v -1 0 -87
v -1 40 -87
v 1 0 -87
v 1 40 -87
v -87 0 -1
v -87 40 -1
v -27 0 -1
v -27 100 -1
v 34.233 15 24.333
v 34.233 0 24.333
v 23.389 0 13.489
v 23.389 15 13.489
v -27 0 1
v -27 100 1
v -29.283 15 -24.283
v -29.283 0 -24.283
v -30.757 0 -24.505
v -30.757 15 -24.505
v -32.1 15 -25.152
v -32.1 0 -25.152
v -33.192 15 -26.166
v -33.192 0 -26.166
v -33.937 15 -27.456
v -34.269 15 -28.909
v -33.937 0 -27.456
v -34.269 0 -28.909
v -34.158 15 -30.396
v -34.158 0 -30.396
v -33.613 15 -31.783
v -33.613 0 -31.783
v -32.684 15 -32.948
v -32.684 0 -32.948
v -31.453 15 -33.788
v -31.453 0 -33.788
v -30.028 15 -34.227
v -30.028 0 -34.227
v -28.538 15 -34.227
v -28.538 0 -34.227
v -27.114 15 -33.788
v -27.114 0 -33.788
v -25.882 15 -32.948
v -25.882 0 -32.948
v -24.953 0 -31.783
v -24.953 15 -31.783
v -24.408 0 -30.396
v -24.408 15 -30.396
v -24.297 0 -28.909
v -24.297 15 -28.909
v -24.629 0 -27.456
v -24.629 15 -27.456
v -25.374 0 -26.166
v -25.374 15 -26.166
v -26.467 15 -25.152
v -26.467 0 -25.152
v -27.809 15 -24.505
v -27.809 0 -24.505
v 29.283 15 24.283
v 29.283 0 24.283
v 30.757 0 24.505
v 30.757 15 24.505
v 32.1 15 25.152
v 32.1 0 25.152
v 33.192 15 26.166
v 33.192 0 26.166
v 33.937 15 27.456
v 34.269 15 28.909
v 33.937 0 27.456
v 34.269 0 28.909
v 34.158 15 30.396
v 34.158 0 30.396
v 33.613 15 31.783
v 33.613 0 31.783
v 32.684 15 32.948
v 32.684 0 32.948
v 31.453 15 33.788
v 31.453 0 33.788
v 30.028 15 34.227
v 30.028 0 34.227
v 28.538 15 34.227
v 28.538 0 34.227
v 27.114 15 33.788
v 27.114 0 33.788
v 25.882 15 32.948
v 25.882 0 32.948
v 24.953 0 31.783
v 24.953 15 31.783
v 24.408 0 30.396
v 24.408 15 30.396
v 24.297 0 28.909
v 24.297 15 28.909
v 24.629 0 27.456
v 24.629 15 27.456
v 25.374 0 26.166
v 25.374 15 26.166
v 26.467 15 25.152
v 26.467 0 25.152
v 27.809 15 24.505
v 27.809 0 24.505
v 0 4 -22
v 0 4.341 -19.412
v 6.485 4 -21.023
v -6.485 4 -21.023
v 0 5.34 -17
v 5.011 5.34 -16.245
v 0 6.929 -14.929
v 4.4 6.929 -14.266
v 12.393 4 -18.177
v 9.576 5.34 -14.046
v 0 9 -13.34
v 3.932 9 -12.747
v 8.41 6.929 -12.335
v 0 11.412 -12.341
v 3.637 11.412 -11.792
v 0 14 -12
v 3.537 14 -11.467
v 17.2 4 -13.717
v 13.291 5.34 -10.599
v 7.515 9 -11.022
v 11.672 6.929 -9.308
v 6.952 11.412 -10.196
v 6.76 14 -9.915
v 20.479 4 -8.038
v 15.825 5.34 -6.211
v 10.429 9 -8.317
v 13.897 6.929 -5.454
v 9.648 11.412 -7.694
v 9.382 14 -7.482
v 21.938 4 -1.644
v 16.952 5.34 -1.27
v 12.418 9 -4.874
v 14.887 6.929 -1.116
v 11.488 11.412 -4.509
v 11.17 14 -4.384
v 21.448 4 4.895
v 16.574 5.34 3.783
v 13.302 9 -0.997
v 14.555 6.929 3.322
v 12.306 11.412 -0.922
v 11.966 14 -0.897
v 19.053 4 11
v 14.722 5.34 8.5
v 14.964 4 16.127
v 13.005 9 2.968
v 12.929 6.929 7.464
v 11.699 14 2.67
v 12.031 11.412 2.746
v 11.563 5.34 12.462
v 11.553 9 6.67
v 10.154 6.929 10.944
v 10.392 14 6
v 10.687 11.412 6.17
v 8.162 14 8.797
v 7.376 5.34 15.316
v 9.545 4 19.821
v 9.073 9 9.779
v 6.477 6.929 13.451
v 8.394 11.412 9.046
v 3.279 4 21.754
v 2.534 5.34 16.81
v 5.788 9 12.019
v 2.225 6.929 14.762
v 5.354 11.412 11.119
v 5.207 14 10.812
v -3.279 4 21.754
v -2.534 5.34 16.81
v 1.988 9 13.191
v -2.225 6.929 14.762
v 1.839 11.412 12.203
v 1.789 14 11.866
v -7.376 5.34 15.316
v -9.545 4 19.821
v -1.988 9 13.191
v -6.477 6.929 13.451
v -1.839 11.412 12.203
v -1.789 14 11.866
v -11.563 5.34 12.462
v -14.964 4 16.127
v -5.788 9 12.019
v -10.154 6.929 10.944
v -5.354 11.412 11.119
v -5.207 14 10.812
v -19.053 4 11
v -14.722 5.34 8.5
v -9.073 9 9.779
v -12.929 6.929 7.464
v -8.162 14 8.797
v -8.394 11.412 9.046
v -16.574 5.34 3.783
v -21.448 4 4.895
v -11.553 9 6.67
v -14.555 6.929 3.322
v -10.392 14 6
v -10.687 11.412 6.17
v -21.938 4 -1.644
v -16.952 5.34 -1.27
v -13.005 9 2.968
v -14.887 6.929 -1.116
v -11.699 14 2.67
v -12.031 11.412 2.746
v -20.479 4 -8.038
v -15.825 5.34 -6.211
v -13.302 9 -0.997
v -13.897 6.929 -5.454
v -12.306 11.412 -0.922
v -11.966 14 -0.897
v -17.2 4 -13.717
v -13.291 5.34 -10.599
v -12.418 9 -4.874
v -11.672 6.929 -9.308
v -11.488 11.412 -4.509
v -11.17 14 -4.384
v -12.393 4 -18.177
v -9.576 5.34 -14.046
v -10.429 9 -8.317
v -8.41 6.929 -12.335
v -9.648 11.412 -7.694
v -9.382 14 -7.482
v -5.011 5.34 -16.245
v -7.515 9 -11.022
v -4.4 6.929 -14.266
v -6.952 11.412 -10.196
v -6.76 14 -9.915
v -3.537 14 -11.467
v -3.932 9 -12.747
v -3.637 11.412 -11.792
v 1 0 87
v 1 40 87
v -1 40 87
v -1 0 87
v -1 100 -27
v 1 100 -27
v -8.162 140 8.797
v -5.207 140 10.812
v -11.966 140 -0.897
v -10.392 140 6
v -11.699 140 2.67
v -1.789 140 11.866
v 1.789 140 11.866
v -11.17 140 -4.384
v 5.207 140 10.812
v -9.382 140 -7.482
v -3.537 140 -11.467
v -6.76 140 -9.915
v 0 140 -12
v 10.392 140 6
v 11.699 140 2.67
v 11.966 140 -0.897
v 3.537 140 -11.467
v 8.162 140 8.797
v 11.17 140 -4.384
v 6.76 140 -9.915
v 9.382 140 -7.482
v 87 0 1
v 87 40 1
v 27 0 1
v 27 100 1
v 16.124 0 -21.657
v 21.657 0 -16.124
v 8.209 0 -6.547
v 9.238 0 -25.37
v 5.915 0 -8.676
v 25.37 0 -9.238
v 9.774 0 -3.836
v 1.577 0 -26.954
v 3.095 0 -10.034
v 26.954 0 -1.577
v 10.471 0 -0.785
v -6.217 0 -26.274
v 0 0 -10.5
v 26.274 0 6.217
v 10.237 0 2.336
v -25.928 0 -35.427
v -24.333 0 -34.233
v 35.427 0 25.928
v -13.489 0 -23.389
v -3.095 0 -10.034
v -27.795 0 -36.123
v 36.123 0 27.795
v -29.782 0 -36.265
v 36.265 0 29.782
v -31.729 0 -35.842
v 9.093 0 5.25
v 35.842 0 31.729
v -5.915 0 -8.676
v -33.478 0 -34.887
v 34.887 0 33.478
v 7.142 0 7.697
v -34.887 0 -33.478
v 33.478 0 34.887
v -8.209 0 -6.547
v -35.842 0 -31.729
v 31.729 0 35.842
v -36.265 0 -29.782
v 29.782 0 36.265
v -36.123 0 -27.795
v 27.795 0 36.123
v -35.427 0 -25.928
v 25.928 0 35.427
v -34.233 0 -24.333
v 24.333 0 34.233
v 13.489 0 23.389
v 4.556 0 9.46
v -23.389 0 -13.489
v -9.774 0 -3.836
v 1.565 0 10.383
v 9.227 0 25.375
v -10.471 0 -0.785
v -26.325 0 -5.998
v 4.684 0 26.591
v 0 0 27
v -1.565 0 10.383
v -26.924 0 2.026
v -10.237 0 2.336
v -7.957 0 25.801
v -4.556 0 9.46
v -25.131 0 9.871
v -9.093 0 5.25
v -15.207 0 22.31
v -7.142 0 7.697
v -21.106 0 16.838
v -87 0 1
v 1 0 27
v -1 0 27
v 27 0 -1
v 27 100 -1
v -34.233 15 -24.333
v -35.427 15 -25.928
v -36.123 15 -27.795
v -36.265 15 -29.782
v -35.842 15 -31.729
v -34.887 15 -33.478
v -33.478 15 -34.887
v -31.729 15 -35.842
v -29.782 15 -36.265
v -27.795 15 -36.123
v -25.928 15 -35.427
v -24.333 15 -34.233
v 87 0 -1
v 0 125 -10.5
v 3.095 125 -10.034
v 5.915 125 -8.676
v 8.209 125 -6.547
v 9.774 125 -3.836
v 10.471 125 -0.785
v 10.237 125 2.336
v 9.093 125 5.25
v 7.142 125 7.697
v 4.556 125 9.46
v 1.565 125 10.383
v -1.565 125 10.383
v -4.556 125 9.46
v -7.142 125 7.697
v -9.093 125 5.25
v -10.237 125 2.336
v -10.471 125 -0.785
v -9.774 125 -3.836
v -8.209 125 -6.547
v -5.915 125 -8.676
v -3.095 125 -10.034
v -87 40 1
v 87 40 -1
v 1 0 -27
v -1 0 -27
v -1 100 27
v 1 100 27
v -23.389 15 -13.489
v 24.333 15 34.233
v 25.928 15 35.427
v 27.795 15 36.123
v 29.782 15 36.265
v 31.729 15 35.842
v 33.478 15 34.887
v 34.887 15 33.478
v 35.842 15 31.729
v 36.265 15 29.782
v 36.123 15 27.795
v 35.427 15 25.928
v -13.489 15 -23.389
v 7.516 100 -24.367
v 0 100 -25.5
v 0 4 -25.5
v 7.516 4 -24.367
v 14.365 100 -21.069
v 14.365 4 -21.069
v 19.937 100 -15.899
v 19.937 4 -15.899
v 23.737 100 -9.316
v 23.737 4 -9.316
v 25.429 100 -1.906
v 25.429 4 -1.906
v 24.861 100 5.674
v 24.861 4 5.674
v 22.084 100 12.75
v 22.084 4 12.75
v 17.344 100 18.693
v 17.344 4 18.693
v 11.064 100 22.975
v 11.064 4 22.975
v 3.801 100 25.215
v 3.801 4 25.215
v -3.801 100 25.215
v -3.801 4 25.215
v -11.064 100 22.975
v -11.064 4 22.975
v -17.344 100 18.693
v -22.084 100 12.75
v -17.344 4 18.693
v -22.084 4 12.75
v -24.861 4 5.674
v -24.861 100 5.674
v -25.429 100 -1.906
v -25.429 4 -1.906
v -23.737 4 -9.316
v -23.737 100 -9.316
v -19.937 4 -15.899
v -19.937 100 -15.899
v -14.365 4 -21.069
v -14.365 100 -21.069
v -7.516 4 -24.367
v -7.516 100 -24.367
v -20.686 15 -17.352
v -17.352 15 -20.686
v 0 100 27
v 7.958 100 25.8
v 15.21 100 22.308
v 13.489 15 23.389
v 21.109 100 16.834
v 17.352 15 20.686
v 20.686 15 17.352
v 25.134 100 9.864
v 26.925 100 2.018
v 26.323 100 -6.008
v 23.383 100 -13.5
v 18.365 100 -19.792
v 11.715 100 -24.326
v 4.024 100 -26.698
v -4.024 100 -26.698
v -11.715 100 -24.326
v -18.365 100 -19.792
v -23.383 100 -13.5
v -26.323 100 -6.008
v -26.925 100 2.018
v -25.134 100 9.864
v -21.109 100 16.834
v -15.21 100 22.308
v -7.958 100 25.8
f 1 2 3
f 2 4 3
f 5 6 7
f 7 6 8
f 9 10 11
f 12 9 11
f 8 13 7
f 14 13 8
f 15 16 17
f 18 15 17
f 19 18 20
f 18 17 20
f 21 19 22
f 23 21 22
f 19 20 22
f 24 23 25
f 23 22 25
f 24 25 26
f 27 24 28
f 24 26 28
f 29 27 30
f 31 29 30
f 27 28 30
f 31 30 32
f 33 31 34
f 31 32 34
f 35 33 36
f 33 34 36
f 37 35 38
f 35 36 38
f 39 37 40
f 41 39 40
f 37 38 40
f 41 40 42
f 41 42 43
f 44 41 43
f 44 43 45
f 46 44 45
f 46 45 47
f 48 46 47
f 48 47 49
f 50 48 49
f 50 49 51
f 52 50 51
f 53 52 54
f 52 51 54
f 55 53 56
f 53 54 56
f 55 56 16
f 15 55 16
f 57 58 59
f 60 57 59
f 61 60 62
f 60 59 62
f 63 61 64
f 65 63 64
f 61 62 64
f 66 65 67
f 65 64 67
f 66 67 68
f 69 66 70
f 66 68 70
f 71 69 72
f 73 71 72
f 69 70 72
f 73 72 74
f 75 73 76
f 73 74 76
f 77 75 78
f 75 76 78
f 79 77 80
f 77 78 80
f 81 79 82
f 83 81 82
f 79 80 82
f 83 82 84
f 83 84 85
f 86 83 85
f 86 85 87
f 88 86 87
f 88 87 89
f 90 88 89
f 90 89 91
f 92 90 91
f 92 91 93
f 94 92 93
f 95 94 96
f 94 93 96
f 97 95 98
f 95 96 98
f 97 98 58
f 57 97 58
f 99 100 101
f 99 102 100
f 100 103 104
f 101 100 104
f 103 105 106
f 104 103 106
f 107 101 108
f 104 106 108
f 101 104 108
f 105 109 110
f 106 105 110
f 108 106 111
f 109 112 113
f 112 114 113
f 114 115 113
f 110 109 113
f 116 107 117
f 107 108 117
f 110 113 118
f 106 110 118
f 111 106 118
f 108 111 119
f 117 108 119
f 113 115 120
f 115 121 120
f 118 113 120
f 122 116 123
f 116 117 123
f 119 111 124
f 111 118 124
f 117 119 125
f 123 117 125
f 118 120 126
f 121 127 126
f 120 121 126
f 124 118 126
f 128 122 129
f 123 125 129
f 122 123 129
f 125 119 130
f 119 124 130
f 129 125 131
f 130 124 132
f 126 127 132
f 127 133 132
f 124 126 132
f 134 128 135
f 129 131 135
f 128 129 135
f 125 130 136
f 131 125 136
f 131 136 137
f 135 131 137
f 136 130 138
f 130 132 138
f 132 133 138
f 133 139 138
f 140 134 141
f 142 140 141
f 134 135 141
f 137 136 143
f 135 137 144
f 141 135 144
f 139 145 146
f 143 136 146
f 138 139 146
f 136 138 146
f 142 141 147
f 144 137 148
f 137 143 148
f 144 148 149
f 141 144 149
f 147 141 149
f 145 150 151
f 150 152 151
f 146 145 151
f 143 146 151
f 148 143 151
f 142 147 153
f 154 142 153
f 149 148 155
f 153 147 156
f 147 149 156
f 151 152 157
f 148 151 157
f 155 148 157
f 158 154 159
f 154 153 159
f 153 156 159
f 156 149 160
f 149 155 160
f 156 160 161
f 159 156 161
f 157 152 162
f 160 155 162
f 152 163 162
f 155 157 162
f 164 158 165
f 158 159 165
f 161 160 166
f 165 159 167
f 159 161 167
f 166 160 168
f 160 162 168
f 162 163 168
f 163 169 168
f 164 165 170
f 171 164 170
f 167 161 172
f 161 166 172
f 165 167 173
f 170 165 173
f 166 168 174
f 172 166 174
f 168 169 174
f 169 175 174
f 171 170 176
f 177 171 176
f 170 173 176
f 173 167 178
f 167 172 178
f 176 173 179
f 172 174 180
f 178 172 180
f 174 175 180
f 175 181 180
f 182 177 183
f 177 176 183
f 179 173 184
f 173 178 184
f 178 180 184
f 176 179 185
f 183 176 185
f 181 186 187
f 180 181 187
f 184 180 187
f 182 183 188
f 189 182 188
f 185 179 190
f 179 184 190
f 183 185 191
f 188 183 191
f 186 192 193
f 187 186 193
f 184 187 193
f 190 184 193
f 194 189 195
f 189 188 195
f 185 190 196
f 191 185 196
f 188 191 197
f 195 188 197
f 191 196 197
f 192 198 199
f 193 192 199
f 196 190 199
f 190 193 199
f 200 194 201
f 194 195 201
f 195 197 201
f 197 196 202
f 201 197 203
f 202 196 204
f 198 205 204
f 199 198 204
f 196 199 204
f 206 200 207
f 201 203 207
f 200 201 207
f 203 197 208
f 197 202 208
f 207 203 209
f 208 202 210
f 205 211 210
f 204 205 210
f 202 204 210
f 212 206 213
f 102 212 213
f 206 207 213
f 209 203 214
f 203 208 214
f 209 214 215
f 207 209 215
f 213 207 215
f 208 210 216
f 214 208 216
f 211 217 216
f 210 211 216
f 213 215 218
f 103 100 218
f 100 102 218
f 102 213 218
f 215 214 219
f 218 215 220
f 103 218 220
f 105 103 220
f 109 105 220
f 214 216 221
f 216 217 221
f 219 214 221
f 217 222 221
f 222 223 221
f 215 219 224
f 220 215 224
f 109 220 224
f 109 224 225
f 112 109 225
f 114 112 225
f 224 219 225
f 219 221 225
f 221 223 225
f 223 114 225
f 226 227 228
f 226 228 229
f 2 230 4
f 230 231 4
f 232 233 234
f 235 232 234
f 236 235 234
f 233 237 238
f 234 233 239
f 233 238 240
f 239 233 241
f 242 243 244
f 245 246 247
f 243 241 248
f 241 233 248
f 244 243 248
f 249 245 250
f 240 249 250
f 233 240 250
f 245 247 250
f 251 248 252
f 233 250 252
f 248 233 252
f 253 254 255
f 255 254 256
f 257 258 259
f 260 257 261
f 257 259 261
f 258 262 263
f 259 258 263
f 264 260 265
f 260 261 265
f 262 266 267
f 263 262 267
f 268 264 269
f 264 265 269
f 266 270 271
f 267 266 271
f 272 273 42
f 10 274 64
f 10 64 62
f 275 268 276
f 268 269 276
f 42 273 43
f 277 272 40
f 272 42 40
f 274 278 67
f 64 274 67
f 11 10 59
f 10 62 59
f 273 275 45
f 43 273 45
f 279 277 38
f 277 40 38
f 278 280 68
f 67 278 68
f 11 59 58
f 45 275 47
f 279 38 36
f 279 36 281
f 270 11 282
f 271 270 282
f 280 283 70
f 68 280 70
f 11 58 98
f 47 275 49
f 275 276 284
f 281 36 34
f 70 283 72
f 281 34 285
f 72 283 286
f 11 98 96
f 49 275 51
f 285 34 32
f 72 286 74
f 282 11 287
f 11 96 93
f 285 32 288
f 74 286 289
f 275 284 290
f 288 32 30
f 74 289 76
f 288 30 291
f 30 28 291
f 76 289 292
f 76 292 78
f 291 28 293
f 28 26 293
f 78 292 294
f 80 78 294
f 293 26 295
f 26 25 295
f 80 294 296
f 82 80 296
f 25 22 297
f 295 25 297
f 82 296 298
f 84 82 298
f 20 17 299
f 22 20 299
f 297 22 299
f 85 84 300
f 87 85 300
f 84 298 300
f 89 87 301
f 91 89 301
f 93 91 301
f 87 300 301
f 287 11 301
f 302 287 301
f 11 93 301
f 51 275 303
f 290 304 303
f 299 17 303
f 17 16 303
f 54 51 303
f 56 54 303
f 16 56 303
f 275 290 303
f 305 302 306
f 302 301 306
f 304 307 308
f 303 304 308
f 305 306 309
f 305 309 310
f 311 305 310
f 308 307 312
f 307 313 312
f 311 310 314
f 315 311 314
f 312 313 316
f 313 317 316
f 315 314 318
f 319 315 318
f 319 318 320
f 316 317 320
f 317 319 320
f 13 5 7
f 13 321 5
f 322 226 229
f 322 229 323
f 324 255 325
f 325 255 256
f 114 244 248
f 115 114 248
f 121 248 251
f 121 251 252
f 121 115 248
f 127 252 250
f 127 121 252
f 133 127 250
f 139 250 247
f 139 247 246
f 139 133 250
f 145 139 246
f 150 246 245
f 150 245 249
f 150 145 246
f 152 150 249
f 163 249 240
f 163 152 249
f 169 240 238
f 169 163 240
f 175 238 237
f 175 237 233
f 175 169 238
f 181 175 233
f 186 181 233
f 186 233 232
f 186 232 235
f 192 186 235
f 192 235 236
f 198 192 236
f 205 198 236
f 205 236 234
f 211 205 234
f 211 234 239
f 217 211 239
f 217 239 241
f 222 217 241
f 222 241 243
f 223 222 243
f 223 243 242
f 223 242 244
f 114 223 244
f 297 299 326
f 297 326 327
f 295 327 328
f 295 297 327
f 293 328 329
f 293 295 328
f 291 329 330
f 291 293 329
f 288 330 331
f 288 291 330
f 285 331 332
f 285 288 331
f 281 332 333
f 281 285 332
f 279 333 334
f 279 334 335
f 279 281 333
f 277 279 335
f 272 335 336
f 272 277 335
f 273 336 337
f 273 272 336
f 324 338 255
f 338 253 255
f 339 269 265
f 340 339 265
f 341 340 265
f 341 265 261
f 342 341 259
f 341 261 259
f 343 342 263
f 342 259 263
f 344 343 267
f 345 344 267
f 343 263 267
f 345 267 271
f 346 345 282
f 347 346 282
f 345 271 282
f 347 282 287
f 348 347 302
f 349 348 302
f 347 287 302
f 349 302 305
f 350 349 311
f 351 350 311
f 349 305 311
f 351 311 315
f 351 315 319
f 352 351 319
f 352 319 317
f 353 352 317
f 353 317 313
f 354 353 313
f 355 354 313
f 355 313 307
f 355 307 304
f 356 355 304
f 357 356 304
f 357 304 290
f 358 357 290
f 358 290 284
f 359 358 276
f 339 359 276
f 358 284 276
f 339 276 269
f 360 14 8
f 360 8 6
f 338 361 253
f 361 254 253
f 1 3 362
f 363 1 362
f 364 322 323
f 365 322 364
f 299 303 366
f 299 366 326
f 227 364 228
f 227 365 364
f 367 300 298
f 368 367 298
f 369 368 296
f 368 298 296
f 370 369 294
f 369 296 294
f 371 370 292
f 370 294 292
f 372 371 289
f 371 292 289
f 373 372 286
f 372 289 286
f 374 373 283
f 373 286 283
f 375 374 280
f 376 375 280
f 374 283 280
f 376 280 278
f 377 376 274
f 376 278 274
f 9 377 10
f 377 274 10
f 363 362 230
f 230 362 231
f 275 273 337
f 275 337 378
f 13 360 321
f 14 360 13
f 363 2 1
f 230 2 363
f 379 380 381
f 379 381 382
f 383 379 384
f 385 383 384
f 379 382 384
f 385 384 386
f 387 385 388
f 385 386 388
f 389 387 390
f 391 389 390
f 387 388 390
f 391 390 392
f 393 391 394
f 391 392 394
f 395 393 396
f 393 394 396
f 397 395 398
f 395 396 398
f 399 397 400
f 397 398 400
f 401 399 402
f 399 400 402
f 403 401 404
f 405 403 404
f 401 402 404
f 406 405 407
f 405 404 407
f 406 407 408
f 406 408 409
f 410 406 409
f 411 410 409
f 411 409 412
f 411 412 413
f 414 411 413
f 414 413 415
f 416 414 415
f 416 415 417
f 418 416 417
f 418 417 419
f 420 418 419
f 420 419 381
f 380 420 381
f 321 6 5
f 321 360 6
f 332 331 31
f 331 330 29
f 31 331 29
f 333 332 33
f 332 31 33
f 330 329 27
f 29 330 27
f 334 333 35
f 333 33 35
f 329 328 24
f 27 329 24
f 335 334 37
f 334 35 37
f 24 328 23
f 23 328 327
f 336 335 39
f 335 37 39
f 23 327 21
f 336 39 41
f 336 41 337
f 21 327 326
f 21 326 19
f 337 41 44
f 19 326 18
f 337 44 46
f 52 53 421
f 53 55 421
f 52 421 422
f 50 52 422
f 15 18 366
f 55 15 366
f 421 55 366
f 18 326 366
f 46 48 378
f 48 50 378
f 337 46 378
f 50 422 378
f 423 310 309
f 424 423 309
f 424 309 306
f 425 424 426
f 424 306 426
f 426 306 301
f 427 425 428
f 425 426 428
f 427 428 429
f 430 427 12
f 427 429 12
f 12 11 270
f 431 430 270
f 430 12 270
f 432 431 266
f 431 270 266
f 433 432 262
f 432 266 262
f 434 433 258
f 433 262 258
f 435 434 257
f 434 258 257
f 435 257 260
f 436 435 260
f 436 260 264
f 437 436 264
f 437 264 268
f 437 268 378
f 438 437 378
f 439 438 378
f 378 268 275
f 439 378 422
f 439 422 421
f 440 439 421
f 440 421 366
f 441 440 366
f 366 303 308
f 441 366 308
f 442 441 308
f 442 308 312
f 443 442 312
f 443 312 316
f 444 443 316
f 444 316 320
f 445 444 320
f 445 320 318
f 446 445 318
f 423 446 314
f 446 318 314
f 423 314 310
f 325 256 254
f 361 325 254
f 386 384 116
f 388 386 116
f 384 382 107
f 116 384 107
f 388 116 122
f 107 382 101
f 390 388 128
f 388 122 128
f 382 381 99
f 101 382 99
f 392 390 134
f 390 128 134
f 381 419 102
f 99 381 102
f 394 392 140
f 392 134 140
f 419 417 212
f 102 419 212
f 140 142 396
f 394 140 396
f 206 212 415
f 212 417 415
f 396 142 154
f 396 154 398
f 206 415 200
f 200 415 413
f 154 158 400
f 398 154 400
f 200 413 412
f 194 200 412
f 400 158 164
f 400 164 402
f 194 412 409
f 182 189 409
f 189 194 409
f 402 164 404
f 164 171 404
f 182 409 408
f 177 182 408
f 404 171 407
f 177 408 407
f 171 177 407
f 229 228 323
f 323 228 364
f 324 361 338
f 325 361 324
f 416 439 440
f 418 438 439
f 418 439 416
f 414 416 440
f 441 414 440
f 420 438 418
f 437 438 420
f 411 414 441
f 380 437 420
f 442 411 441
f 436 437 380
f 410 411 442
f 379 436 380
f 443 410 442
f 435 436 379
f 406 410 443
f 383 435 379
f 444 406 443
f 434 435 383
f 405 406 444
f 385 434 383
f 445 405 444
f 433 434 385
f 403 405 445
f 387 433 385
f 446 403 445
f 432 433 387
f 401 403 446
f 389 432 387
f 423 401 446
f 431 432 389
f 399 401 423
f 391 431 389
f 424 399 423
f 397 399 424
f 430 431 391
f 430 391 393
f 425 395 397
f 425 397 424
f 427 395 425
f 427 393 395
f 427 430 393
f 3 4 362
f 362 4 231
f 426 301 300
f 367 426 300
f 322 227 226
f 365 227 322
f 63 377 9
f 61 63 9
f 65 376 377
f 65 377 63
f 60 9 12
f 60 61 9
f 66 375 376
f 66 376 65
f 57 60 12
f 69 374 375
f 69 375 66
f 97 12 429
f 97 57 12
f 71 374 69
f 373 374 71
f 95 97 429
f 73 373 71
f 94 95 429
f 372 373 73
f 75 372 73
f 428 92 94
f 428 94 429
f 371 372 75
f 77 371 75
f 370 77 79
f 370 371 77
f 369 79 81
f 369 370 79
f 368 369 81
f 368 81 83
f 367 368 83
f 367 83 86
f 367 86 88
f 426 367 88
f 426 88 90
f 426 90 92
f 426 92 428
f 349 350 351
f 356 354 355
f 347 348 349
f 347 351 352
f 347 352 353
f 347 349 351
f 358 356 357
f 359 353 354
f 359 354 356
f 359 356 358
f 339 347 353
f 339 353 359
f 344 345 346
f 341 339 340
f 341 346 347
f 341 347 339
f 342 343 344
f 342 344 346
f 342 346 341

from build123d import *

# Parameters (mm, degrees)
SKETCH1_R             = 27
BOSS_EXTRUDE1_DEPTH   = 100
BOSS_EXTRUDE2_DEPTH   = 1
BOSS_EXTRUDE2_2_DEPTH = 1
BOSS_EXTRUDE3_DEPTH   = 1
BOSS_EXTRUDE3_2_DEPTH = 1
SKETCH4_R             = 25.5
CUT_EXTRUDE1_DEPTH    = 159.549676758
SKETCH9_R             = 27
BOSS_EXTRUDE6_DEPTH   = 4
SKETCH10_R            = 12
BOSS_EXTRUDE7_DEPTH   = 140
SKETCH11_R            = 10.5
CUT_EXTRUDE3_DEPTH    = 125
FILLET1_R             = 10
BOSS_EXTRUDE8_DEPTH   = 15
SKETCH14_R            = 5
CUT_EXTRUDE4_DEPTH    = 15


with BuildPart() as part:
    # Sketch1 → Boss-Extrude1 (new body)
    with BuildSketch(Plane(origin=(0, 0, 0), x_dir=(1, 0, 0), z_dir=(0, 1, 0))):
        with Locations(Location((0, 0, 0), (0, 0, 270))):
            Circle(SKETCH1_R)
    extrude(amount=BOSS_EXTRUDE1_DEPTH)

    # Sketch4 → Cut-Extrude1 (cut, through all)
    with BuildSketch(Plane(origin=(0, 0, 0), x_dir=(-1, 0, 0), z_dir=(0, -1, 0))):
        with Locations(Location((0, 0, 0), (0, 0, 90))):
            Circle(SKETCH4_R)
    extrude(amount=-CUT_EXTRUDE1_DEPTH, mode=Mode.SUBTRACT)

    # Sketch9 → Boss-Extrude6 (add)
    with BuildSketch(Plane.XZ):
        with Locations(Location((0, 0, 0), (0, 0, 90))):
            Circle(SKETCH9_R)
    extrude(amount=-BOSS_EXTRUDE6_DEPTH)

    # Sketch10 → Boss-Extrude7 (add)
    with BuildSketch(Plane.XZ):
        with Locations(Location((0, 0, 0), (0, 0, 270))):
            Circle(SKETCH10_R)
    extrude(amount=-BOSS_EXTRUDE7_DEPTH)

    # Sketch11 → Cut-Extrude3 (cut)
    with BuildSketch(Plane.XZ):
        with Locations(Location((0, 0, 0), (0, 0, 270))):
            Circle(SKETCH11_R)
    extrude(amount=-CUT_EXTRUDE3_DEPTH, mode=Mode.SUBTRACT)

    # Fillet1
    fillet1_edges = [part.edges().sort_by_distance(p)[0] for p in [
        (0, 4, 12),
    ]]
    fillet(fillet1_edges, radius=FILLET1_R)

    # Sketch13 → Boss-Extrude8 (add)
    with BuildSketch(Plane.XZ):
        with BuildLine():
            Line((13.489341446, 23.388836383), (24.33335346, 34.232848397))
            ThreePointArc((24.33335346, 34.232848397), (34.232848397, 34.232848397), (34.232848397, 24.33335346))
            Line((34.232848397, 24.33335346), (23.388836383, 13.489341446))
            Line((23.388836383, 13.489341446), (13.489341446, 23.388836383))
        make_face()
        with BuildLine():
            Line((-23.388836383, -13.489341446), (-34.232848397, -24.33335346))
            ThreePointArc((-34.232848397, -24.33335346), (-34.232848397, -34.232848397), (-24.33335346, -34.232848397))
            Line((-24.33335346, -34.232848397), (-13.489341446, -23.388836383))
            Line((-13.489341446, -23.388836383), (-23.388836383, -13.489341446))
        make_face()
    extrude(amount=-BOSS_EXTRUDE8_DEPTH)

    # Sketch14 → Cut-Extrude4 (cut)
    with BuildSketch(Plane.XZ):
        with Locations(Location((29.283100929, 29.283100929, 0), (0, 0, 270))):
            Circle(SKETCH14_R)
        with Locations(Location((-29.283100929, -29.283100929, 0), (0, 0, 90))):
            Circle(SKETCH14_R)
    extrude(amount=-CUT_EXTRUDE4_DEPTH, mode=Mode.SUBTRACT)


with BuildPart() as body_2:
    # Sketch2 → Boss-Extrude2 (new, symmetric)
    with BuildSketch(Plane.XY):
        Polygon((27, 100), (87, 40), (87, 0), (27, 0), align=None)
    extrude(amount=BOSS_EXTRUDE2_DEPTH, both=True)


with BuildPart() as body_3:
    # Sketch2 → Boss-Extrude2 2 (new, symmetric)
    with BuildSketch(Plane.XY):
        Polygon((-87, 0), (-27, 0), (-27, 100), (-87, 40), align=None)
    extrude(amount=BOSS_EXTRUDE2_2_DEPTH, both=True)


with BuildPart() as body_4:
    # Sketch3 → Boss-Extrude3 (new, symmetric)
    with BuildSketch(Plane(origin=(0, 0, 0), x_dir=(0, 0, -1), z_dir=(1, 0, 0))):
        Polygon((-27, 100), (-87, 40), (-87, 0), (-27, 0), align=None)
    extrude(amount=BOSS_EXTRUDE3_DEPTH, both=True)


with BuildPart() as body_5:
    # Sketch3 → Boss-Extrude3 2 (new, symmetric)
    with BuildSketch(Plane(origin=(0, 0, 0), x_dir=(0, 0, -1), z_dir=(1, 0, 0))):
        Polygon((27, 0), (27, 100), (87, 40), (87, 0), align=None)
    extrude(amount=BOSS_EXTRUDE3_2_DEPTH, both=True)


solid = Compound([part.part, body_2.part, body_3.part, body_4.part, body_5.part])
